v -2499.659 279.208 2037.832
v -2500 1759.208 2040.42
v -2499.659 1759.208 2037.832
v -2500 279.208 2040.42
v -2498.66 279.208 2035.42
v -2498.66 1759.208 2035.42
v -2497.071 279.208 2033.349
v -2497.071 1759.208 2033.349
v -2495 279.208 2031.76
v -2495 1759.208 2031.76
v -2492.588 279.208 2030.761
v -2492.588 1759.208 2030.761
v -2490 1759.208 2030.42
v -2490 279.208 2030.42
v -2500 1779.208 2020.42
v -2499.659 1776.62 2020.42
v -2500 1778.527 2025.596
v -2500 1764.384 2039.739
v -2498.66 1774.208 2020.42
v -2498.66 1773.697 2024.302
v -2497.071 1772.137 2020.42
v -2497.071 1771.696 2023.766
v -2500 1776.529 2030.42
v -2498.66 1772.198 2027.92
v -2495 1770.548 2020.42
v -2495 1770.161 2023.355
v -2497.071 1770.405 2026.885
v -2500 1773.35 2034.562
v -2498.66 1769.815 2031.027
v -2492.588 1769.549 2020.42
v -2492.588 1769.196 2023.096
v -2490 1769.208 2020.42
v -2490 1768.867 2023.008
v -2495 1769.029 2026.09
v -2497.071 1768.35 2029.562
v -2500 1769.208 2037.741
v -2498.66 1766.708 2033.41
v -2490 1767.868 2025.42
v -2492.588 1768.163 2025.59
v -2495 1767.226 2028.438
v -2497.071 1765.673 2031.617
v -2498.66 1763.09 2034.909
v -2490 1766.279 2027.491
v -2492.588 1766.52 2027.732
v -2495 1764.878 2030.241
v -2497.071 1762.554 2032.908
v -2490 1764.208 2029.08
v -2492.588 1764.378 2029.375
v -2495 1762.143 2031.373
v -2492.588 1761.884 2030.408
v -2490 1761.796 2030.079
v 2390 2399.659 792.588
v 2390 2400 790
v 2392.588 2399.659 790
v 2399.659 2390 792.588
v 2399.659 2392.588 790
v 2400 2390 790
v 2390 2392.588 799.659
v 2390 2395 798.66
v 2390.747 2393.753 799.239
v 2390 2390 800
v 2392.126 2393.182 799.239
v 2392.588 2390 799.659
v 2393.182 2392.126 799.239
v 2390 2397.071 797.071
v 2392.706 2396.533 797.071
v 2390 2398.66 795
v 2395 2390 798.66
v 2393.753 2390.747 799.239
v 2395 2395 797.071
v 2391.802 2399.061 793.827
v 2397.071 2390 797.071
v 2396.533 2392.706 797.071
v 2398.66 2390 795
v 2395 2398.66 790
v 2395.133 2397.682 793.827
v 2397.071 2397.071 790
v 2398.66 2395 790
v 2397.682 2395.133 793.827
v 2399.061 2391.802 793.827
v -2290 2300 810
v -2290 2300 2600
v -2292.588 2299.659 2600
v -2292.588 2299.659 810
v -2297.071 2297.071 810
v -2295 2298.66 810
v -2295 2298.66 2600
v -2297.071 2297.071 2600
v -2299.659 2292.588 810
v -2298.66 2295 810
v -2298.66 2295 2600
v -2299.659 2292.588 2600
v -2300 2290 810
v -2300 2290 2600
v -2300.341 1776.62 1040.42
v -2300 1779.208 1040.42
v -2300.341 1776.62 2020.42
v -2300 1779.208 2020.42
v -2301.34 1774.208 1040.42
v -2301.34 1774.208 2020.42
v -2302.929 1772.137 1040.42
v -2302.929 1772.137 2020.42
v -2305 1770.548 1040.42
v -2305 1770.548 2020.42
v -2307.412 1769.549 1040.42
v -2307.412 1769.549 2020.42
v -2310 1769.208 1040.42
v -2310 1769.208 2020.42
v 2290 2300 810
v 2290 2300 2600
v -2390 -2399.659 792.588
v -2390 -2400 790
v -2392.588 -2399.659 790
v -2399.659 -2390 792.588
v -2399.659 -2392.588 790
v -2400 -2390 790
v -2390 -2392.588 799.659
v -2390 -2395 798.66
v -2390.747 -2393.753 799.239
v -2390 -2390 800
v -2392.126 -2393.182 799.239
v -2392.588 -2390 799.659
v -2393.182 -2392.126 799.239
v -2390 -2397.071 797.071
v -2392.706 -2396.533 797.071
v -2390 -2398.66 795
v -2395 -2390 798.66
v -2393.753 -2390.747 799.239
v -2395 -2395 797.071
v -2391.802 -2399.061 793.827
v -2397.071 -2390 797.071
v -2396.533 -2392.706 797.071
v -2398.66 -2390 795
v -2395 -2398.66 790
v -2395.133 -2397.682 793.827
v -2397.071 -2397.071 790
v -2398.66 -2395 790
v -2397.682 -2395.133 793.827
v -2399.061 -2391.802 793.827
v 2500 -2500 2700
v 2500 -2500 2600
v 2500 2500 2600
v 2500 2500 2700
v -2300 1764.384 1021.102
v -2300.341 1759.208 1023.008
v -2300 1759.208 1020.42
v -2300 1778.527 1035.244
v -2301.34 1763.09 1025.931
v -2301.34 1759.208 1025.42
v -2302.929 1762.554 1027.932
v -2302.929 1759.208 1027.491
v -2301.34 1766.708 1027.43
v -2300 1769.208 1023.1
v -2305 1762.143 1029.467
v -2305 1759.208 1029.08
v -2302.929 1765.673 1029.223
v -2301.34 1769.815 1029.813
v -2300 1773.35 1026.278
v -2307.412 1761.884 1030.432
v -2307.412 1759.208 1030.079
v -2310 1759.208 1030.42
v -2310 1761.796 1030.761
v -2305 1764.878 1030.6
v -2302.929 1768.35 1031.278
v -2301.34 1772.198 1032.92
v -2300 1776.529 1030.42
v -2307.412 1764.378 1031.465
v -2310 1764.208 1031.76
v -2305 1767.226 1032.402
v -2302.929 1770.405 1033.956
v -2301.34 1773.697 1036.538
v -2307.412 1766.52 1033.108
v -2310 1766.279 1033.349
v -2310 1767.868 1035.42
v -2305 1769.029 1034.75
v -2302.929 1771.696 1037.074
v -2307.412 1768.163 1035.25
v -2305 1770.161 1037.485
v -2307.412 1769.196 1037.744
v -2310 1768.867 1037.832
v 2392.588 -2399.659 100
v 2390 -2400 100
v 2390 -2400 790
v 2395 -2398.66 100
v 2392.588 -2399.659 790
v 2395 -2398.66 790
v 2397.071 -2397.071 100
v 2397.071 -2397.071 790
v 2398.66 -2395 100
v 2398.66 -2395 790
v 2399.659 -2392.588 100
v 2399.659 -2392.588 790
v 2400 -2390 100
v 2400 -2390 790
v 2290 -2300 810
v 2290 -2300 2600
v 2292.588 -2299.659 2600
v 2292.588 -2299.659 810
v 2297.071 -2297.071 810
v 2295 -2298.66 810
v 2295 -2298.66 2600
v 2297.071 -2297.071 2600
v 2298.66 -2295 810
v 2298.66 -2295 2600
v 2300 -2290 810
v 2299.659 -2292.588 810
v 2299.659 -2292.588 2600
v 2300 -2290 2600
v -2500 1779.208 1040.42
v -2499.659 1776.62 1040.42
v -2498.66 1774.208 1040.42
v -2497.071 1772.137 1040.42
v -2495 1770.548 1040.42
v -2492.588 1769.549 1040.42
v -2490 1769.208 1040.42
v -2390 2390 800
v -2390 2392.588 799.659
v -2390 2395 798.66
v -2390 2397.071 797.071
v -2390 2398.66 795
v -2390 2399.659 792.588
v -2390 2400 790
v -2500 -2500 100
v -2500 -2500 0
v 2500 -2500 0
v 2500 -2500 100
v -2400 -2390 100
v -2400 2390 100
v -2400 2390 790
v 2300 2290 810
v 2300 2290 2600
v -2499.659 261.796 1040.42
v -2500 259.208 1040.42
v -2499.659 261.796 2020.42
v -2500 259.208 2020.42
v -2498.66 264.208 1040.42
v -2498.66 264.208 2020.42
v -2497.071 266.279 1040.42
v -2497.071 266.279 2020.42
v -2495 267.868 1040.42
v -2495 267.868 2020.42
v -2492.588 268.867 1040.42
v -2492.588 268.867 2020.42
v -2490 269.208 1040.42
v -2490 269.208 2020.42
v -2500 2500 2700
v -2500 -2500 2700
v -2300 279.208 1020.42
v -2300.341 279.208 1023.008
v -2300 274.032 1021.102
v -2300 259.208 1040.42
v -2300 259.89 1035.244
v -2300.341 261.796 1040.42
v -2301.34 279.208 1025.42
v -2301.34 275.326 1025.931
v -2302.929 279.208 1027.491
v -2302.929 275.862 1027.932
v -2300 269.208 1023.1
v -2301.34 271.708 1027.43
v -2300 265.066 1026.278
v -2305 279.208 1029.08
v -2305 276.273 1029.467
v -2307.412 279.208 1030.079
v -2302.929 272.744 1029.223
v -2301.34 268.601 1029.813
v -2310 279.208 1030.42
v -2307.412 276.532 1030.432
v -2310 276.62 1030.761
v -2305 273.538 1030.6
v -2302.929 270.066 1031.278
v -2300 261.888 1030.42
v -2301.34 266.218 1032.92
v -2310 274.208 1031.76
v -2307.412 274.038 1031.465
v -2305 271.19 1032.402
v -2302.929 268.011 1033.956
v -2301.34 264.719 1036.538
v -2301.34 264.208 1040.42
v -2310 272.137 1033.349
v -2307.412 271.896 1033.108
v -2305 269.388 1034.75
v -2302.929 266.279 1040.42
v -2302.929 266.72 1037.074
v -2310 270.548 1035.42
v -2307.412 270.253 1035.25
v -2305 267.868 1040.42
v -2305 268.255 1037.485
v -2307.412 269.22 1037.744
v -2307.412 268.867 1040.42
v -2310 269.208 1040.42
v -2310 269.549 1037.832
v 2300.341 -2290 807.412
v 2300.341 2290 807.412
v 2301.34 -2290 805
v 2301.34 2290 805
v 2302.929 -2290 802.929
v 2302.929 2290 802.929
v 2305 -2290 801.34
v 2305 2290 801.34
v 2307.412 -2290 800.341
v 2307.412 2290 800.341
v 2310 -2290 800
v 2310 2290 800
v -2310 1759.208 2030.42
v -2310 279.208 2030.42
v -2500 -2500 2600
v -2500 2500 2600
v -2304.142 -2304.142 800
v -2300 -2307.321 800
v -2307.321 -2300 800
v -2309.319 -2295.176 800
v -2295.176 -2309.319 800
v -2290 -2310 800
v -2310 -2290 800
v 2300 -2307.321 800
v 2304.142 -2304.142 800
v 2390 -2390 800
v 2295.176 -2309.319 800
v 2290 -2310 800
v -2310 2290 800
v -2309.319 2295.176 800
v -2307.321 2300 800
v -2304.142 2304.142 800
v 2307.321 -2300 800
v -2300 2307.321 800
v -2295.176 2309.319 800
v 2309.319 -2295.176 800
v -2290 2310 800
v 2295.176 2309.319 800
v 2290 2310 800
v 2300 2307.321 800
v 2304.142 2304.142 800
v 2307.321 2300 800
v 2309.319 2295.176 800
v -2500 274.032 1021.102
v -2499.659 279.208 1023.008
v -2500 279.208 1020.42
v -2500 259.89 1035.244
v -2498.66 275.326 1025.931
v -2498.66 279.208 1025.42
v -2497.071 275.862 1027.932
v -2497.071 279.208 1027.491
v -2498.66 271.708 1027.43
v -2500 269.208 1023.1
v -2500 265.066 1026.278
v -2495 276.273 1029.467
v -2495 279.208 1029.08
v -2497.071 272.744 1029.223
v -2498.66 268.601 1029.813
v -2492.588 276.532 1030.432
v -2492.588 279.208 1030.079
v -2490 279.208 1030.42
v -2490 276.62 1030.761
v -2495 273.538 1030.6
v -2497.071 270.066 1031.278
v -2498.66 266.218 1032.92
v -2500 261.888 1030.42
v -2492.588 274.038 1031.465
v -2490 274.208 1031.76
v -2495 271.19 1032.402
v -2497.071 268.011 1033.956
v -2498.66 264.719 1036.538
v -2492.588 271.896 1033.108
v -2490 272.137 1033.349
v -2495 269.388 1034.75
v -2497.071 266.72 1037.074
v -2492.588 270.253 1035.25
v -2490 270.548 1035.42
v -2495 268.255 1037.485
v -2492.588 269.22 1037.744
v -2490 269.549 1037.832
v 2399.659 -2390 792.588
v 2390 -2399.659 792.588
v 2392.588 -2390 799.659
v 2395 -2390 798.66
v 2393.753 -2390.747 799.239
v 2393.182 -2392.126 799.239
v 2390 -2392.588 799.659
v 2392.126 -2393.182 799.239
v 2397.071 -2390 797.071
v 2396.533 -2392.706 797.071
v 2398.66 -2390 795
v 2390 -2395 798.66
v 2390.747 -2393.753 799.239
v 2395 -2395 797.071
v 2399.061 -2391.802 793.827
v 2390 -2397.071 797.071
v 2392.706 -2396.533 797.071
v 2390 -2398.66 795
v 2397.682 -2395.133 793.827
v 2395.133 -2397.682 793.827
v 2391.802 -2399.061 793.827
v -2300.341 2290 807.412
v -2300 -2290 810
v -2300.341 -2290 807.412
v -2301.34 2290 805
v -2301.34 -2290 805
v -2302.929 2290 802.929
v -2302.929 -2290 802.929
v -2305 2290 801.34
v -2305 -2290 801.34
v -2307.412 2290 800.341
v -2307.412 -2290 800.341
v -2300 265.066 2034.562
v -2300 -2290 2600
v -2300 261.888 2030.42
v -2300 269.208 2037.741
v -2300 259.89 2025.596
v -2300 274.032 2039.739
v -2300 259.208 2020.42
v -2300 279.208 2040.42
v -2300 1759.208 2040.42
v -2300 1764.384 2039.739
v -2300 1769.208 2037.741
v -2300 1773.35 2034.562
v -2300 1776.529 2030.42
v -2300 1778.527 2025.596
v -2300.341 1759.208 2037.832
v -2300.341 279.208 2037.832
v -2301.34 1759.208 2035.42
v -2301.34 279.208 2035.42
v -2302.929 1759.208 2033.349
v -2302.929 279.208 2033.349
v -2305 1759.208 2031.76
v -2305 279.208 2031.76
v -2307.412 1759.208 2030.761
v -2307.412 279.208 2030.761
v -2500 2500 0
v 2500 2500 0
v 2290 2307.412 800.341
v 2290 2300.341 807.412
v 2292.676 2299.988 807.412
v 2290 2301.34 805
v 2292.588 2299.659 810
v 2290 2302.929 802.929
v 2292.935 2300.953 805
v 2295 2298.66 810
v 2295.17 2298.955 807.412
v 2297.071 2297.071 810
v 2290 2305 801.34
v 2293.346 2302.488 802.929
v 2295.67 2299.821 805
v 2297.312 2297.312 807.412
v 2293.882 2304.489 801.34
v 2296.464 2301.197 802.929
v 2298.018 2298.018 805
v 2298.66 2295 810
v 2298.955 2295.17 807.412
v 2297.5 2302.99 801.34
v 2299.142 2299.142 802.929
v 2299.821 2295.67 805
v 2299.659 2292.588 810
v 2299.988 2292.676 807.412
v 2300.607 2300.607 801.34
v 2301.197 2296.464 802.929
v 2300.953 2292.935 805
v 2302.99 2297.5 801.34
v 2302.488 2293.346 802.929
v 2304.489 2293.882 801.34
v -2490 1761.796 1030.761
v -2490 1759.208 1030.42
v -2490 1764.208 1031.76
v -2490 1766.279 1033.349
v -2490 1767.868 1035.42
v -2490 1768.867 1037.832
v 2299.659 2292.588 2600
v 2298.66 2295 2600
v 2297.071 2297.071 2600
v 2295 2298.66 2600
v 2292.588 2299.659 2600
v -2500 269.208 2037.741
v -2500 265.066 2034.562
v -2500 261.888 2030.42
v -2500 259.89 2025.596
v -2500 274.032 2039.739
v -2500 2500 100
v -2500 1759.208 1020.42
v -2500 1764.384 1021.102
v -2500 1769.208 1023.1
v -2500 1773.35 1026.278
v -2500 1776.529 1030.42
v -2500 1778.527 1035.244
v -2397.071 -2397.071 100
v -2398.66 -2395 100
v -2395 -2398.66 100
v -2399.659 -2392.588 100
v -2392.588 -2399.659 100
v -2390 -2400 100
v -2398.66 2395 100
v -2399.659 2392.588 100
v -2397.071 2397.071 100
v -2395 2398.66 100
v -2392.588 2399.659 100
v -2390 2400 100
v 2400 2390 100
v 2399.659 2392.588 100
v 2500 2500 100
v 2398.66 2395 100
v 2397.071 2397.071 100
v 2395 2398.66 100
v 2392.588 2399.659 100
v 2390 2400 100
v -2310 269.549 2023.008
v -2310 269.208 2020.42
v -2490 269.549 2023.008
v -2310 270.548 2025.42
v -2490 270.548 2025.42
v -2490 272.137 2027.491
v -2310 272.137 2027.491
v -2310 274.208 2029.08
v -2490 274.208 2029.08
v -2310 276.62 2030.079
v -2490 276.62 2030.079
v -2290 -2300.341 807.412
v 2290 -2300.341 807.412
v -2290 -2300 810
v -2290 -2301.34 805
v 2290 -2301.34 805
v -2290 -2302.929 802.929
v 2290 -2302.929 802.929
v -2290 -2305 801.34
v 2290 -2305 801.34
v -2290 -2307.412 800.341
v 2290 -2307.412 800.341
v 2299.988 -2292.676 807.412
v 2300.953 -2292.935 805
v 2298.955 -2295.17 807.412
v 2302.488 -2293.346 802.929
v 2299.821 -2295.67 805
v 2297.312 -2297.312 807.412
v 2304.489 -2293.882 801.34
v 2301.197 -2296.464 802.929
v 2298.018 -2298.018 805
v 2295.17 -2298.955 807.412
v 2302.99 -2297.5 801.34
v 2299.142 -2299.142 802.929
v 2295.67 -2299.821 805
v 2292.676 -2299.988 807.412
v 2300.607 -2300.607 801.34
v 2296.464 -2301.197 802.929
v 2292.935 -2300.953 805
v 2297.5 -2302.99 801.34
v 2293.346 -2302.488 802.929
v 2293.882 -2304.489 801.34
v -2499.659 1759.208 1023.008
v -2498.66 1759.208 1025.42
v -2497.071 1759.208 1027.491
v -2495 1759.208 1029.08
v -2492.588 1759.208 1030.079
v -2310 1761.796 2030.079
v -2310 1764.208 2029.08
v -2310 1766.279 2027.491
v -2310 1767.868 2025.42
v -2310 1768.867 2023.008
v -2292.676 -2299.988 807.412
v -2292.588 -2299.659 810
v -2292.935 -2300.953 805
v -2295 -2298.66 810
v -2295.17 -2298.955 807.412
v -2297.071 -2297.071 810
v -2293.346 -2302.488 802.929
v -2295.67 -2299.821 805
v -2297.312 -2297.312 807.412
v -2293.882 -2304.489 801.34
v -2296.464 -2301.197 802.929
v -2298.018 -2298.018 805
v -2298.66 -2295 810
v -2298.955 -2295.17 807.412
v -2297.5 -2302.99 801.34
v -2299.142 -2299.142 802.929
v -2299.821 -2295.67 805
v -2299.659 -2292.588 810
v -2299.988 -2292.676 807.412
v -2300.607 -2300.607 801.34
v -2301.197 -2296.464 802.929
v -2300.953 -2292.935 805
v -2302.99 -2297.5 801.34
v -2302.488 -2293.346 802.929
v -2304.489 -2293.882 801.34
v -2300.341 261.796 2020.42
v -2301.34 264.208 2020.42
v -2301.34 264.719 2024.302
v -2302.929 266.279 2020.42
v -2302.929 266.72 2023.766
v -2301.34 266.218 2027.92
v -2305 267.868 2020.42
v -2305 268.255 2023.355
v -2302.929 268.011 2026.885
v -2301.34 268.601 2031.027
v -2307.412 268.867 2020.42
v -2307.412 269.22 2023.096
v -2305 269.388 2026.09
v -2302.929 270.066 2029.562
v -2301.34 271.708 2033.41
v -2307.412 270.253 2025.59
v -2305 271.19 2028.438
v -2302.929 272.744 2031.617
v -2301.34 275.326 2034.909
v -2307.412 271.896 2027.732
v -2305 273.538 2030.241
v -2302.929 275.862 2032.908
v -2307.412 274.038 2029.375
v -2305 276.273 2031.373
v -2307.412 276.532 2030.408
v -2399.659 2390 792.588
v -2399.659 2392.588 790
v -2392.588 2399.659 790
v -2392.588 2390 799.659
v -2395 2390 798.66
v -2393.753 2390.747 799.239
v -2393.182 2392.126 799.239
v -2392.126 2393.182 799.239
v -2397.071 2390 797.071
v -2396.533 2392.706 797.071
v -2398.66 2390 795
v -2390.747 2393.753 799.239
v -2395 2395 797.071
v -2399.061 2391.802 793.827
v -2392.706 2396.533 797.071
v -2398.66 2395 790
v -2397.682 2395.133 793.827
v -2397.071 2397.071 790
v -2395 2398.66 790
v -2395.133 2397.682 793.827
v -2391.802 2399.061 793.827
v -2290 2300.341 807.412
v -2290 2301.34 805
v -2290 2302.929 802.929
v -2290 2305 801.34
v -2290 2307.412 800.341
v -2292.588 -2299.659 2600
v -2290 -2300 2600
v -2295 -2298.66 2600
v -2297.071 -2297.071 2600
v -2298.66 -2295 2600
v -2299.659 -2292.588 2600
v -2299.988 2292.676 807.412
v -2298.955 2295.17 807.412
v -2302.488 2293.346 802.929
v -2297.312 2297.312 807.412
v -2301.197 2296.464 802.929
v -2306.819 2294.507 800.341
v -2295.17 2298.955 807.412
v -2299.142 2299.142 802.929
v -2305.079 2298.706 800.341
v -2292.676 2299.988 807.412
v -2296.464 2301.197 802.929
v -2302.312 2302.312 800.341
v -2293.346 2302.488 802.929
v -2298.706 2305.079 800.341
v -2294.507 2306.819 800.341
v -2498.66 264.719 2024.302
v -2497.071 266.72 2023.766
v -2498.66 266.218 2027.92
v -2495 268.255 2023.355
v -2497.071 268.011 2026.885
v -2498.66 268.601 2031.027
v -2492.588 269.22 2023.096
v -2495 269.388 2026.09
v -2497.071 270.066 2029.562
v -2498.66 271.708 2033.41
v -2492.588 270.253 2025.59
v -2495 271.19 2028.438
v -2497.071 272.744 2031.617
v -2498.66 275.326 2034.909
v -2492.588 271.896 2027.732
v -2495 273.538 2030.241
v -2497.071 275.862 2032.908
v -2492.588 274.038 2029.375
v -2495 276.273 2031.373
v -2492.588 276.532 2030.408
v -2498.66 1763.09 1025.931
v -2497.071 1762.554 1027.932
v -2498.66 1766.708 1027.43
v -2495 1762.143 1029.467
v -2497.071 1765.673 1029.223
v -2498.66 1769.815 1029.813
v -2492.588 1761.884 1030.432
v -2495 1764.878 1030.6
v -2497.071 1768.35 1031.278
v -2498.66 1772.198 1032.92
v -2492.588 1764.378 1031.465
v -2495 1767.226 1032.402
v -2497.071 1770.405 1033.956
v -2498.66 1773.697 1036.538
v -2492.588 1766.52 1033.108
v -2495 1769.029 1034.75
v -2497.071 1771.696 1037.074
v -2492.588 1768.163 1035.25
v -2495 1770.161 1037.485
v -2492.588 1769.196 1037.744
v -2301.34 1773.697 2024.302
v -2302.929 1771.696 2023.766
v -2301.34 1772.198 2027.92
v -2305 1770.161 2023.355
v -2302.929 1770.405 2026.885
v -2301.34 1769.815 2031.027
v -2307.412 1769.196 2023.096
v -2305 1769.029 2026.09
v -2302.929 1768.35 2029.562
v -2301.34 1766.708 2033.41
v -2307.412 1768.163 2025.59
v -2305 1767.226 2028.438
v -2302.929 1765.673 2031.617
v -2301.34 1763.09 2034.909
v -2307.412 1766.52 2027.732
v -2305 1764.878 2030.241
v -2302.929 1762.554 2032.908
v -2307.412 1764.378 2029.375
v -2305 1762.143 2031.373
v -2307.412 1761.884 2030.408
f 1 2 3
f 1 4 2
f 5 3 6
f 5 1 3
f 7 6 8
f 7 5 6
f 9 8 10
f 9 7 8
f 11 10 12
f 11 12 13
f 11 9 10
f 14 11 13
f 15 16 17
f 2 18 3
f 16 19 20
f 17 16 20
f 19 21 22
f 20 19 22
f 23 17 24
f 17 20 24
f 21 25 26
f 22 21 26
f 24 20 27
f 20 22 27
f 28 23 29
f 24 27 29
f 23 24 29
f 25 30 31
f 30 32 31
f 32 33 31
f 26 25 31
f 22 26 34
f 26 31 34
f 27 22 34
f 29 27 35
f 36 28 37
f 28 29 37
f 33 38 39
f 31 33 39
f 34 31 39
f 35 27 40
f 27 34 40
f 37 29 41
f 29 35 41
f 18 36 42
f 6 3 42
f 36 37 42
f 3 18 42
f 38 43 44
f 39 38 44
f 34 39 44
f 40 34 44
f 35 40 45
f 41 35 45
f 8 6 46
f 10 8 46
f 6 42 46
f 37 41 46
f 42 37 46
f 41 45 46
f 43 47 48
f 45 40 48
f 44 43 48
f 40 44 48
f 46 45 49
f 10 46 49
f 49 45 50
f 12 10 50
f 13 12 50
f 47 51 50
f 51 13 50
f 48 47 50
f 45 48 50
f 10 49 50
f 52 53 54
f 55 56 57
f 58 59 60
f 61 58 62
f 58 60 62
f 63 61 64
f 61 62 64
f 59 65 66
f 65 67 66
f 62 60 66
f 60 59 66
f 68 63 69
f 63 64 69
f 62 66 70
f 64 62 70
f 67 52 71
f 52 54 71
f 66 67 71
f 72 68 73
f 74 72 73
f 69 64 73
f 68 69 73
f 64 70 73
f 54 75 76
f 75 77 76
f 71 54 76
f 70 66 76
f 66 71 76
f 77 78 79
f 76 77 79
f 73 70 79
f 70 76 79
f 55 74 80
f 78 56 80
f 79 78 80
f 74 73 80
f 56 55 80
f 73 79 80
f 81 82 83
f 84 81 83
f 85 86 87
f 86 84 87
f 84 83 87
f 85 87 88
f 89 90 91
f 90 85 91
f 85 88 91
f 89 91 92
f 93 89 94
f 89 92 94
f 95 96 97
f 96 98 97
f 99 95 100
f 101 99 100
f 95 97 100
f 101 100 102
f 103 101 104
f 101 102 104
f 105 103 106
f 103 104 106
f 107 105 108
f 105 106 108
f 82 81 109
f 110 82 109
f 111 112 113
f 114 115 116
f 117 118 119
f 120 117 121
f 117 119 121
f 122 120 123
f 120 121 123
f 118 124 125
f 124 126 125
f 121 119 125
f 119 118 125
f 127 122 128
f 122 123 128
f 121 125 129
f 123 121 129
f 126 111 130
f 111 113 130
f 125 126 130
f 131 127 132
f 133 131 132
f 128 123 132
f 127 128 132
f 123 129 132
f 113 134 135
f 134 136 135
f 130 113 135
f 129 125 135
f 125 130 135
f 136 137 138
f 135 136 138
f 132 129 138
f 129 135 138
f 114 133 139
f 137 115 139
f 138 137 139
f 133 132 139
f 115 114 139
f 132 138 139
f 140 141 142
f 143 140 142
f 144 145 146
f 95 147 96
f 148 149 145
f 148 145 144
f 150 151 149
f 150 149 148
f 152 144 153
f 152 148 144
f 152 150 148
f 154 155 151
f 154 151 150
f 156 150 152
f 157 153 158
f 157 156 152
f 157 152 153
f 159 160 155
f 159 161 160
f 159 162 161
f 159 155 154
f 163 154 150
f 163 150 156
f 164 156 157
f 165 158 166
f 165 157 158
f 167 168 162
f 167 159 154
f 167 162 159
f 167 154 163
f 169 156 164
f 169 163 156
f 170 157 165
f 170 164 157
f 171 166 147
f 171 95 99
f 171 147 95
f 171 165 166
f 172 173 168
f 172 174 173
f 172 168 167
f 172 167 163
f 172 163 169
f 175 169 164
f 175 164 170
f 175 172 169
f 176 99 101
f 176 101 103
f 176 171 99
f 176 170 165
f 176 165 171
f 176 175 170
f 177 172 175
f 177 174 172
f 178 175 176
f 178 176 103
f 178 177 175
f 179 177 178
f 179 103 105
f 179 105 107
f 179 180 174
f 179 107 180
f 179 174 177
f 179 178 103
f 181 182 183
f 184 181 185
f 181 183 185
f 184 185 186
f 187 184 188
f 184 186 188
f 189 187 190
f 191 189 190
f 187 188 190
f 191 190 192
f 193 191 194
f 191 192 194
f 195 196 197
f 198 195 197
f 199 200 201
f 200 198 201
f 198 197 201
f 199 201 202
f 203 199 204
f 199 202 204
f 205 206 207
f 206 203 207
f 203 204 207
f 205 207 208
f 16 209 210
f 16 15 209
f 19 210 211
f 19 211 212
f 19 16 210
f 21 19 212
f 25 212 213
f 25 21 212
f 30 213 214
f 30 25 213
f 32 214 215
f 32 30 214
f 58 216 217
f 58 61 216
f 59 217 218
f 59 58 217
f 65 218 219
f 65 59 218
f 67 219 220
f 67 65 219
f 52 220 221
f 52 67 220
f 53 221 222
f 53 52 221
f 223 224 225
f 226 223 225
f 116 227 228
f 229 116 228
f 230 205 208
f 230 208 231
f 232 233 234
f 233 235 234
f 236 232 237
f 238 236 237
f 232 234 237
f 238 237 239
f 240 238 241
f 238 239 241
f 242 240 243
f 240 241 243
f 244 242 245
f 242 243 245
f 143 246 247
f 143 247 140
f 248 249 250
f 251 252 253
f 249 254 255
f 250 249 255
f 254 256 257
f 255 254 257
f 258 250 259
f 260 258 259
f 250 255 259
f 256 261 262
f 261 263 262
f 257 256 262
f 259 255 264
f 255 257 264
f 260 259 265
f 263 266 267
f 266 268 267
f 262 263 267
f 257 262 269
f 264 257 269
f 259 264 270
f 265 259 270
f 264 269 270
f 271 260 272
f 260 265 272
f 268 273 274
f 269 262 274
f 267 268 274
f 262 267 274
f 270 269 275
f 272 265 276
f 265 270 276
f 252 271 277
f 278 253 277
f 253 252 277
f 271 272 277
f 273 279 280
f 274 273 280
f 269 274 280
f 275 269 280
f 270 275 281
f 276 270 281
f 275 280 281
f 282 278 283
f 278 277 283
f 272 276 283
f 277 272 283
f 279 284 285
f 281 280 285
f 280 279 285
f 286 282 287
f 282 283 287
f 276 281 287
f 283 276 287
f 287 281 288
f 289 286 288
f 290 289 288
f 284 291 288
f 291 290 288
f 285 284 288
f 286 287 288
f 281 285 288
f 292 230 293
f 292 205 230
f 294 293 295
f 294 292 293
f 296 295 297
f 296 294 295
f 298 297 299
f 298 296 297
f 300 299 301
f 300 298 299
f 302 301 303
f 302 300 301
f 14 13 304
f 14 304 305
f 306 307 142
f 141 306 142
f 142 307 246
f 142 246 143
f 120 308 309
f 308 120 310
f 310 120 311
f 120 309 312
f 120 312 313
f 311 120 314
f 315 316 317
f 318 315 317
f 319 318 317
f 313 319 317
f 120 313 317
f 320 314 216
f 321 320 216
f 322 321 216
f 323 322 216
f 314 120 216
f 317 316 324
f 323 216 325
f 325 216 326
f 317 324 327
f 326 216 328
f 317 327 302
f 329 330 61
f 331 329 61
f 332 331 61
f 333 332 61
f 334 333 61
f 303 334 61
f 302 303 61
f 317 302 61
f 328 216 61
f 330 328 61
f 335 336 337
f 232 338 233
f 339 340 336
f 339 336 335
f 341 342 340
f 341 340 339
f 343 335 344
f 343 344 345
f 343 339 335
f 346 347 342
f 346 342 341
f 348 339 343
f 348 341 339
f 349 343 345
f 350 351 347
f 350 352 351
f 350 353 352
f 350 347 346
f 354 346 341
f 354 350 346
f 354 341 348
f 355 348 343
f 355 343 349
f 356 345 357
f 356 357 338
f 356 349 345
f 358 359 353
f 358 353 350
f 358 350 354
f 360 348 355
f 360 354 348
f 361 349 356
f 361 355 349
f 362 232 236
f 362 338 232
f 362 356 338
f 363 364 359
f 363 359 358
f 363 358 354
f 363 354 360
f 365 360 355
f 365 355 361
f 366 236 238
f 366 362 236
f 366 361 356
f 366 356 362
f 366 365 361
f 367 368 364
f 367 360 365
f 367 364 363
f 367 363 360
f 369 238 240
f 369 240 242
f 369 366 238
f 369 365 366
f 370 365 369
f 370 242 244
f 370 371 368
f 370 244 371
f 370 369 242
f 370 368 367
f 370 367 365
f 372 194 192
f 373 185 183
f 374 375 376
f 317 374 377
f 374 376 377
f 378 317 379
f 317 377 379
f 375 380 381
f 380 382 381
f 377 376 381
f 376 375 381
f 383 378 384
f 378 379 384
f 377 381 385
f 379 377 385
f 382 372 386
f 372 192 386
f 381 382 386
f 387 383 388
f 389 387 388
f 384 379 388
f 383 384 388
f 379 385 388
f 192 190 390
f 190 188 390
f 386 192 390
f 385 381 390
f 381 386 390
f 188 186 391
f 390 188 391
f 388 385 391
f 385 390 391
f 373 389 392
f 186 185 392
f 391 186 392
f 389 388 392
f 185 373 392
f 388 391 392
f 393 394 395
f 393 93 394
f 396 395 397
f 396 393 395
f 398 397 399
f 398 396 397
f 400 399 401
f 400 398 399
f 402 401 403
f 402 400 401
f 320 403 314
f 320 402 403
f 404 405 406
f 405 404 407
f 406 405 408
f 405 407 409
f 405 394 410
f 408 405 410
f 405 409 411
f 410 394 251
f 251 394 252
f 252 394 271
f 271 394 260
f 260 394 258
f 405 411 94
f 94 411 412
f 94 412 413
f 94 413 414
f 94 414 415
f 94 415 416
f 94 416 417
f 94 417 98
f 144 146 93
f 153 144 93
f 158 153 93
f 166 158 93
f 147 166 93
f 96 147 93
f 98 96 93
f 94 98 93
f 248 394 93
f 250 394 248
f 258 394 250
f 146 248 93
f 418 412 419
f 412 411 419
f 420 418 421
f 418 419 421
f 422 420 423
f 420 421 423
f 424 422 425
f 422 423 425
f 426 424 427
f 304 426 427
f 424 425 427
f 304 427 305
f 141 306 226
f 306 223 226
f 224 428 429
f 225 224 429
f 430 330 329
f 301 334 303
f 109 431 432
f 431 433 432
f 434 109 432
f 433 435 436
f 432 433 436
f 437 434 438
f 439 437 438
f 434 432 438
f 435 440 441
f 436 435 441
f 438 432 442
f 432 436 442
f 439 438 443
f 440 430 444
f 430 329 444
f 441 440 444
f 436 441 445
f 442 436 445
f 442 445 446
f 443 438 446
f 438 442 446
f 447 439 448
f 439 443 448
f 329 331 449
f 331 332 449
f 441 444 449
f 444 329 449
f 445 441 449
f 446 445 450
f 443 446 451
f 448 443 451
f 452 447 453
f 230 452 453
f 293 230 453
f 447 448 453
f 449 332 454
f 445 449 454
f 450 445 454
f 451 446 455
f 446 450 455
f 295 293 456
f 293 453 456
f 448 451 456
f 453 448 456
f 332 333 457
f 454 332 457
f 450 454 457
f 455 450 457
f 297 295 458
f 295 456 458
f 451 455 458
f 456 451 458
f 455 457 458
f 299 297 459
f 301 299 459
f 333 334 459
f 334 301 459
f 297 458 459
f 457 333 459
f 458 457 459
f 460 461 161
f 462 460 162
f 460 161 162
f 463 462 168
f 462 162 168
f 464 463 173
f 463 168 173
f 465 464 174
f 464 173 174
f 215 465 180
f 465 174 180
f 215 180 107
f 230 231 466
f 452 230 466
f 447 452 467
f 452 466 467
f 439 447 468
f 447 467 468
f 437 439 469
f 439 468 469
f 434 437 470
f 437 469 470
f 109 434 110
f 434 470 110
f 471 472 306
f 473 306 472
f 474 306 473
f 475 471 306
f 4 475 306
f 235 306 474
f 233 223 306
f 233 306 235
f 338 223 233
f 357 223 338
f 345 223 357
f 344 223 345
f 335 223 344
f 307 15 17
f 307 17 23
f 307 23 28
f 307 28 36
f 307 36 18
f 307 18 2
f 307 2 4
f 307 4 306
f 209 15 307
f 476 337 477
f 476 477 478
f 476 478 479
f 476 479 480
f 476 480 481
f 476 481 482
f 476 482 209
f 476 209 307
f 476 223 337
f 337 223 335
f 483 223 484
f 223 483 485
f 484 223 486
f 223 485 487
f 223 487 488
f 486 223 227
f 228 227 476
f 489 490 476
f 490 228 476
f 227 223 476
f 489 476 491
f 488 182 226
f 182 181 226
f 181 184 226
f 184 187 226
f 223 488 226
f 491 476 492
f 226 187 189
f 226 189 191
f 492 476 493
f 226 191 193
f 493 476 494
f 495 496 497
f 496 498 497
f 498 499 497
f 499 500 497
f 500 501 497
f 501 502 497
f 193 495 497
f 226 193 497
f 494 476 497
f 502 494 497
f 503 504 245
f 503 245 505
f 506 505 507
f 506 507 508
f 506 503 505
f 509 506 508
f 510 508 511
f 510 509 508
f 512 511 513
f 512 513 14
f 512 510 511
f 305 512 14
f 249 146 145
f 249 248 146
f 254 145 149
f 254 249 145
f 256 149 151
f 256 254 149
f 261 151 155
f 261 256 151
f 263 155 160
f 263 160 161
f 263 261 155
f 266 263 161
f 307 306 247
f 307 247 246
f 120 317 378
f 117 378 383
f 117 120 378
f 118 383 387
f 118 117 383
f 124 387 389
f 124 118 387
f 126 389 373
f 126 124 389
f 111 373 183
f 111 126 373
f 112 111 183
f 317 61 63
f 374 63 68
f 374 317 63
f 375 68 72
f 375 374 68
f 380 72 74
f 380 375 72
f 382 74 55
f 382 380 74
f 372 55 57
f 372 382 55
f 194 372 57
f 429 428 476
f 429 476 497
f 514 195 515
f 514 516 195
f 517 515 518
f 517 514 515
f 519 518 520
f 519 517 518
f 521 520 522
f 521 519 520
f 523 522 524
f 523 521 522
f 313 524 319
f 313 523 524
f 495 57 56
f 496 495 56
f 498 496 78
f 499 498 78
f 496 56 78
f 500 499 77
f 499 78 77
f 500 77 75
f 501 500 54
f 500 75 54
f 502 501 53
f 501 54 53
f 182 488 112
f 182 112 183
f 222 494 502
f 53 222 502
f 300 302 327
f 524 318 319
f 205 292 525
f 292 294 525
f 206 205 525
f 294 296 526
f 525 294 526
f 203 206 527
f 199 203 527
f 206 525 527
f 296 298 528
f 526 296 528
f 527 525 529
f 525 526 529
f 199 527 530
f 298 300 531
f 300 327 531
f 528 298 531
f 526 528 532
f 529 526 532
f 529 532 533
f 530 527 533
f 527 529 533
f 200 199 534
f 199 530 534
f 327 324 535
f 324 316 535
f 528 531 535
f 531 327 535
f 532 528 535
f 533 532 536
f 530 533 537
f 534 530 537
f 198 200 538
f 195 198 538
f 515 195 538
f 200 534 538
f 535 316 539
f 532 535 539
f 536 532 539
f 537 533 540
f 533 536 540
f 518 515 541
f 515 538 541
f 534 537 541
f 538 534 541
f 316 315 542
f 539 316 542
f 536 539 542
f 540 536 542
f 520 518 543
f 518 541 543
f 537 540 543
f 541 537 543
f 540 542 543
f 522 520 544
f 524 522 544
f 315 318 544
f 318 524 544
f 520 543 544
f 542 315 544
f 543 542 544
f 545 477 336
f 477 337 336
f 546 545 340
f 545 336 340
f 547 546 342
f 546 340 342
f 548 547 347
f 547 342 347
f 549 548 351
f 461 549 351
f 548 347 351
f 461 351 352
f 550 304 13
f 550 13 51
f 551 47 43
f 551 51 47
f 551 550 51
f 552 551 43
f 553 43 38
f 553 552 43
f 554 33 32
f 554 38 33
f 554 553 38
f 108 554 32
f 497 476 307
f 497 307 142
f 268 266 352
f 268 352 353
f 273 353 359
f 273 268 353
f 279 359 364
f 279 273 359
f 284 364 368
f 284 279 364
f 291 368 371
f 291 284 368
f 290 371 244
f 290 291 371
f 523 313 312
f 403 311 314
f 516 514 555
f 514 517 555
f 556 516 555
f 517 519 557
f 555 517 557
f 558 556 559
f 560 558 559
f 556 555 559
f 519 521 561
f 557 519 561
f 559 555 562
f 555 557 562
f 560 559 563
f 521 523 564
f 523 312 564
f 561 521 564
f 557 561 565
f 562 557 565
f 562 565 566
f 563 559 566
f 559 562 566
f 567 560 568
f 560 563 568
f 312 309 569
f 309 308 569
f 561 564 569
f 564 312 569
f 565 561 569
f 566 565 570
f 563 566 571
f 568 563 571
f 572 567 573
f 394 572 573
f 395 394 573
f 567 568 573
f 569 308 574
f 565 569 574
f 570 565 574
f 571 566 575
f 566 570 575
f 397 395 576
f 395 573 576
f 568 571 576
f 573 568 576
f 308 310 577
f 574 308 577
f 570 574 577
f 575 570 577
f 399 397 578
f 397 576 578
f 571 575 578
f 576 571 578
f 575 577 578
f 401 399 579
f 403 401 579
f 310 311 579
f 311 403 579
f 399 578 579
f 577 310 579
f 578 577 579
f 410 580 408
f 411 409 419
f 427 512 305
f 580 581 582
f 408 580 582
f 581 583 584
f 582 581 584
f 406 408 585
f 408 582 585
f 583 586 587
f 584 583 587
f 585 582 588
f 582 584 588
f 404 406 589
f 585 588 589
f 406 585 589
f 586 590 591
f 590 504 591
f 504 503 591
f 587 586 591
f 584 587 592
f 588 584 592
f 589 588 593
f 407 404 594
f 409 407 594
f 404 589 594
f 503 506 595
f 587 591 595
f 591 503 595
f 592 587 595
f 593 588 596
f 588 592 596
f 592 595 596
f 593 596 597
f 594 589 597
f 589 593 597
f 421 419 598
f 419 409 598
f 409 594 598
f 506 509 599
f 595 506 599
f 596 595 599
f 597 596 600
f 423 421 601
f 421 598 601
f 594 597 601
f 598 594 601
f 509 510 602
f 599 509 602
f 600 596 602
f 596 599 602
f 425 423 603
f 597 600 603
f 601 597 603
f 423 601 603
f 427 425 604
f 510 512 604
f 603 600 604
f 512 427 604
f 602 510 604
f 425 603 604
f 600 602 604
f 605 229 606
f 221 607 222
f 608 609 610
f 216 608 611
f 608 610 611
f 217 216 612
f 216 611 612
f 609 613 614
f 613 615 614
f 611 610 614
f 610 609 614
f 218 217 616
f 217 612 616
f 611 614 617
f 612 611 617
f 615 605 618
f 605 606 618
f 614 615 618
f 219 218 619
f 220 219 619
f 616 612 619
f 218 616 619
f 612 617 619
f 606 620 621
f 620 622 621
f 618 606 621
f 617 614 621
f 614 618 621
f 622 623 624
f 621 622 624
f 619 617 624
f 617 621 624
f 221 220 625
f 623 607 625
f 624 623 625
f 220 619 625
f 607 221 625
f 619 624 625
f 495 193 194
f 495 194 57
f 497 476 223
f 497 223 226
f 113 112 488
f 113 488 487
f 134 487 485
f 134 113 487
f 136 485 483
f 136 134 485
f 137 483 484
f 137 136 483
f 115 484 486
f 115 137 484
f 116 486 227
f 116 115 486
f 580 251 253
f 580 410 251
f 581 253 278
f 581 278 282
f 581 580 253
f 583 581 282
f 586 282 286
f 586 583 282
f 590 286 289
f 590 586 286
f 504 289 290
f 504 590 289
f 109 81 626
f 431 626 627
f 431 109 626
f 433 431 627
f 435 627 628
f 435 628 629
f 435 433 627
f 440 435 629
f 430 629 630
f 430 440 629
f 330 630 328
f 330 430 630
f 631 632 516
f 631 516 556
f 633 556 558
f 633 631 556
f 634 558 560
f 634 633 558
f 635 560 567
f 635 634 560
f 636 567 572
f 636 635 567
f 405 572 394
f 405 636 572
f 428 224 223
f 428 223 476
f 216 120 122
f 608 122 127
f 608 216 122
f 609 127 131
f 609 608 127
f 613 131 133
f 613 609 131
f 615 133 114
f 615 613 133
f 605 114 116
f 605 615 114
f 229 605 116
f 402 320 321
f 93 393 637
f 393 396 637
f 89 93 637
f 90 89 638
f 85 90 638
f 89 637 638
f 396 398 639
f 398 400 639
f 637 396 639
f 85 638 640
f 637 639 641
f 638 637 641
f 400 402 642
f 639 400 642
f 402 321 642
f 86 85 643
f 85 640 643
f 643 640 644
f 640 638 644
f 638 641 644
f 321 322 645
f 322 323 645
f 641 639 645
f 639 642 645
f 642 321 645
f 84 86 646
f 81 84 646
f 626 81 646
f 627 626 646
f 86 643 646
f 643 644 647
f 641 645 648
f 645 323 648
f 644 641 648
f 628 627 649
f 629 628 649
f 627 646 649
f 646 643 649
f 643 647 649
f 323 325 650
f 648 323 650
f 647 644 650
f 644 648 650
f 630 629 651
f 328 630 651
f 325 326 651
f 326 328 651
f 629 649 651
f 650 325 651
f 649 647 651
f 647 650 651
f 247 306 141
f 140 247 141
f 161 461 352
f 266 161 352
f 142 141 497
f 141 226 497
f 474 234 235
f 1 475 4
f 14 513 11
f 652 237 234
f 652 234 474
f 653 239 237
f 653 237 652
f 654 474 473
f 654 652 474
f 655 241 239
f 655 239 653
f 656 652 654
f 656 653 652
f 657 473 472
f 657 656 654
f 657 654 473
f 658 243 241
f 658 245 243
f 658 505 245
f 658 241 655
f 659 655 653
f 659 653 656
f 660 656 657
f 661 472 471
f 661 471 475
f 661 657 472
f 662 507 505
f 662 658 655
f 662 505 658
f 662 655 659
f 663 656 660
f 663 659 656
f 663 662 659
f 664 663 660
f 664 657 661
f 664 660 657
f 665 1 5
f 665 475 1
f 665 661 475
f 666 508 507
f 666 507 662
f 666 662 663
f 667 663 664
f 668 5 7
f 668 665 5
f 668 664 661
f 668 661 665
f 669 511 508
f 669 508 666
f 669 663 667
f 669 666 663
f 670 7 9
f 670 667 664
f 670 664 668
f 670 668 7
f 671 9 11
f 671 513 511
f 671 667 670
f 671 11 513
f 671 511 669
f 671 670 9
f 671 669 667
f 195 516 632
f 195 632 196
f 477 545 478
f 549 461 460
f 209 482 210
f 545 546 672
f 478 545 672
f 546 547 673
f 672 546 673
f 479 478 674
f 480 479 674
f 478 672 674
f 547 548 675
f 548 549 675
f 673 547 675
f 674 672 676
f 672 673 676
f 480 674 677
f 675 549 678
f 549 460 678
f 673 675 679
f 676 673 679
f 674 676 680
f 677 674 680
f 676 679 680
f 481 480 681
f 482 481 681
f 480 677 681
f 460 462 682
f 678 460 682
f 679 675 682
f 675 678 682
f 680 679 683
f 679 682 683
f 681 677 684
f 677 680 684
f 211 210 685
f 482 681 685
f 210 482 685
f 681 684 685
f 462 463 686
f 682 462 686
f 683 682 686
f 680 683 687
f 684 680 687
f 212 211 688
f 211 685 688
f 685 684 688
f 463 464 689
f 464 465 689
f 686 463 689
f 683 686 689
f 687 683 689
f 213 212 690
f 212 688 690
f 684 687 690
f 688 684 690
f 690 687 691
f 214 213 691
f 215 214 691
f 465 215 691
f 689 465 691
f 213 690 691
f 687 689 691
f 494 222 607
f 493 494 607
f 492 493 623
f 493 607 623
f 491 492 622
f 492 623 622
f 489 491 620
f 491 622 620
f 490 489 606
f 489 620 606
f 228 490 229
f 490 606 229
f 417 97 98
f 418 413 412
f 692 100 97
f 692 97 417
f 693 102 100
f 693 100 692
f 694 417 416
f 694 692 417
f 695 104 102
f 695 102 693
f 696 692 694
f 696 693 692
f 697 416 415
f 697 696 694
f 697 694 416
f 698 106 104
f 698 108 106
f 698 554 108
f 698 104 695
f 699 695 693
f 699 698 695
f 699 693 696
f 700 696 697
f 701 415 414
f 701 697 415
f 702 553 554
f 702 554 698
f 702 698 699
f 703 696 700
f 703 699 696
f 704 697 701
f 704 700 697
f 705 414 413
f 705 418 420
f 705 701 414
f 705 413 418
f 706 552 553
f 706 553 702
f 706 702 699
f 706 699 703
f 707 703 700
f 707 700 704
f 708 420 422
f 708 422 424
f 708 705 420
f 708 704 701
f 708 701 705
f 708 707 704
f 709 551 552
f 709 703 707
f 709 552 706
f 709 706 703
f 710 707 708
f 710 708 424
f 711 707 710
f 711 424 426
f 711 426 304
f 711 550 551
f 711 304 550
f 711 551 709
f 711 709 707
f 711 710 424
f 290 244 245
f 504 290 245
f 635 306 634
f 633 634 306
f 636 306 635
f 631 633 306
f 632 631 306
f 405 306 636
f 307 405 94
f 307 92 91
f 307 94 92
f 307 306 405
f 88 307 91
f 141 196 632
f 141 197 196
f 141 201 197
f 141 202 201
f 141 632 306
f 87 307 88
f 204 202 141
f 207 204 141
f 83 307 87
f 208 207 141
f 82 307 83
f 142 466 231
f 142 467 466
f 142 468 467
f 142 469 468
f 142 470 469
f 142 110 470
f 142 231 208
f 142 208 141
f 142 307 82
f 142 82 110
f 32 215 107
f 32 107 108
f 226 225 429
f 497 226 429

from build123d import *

# Parameters (mm, degrees)
F0_W     = 5000
F0_H     = 5000
F1_DEPTH = 100
F2_W     = 5000
F2_H     = 5000
F2_W_2   = 4800
F2_H_2   = 4800
F3_DEPTH = 700
F4_W     = 5000
F4_H     = 5000
F4_W_2   = 4800
F4_H_2   = 4800
F4_W_3   = 4600
F4_H_3   = 4600
F5_DEPTH = 1800
F6_W     = 5000
F6_H     = 5000
F6_W_2   = 4600
F6_H_2   = 4600
F7_DEPTH = 100
F8_W     = 1500
F8_H     = 1000
F9_DEPTH = 200
F10_R    = 10
F11_R    = 10
F12_R    = 10


with BuildPart() as f1:
    # F0 (on Top) → F1 (new body)
    with BuildSketch(Plane.XY):
        Rectangle(F0_W, F0_H)
    extrude(amount=F1_DEPTH)


with BuildPart() as f3:
    # F2 (on face) → F3 (new body)
    with BuildSketch(Plane.XY.offset(100)):
        Rectangle(F2_W, F2_H)
        Rectangle(F2_W_2, F2_H_2, mode=Mode.SUBTRACT)
    extrude(amount=F3_DEPTH)

    # F4 (on face) → F5 (join)
    with BuildSketch(Plane.XY.offset(800)):
        Rectangle(F4_W, F4_H)
        Rectangle(F4_W_2, F4_H_2, mode=Mode.SUBTRACT)
        Rectangle(F4_W_2, F4_H_2)
        Rectangle(F4_W_3, F4_H_3, mode=Mode.SUBTRACT)
    extrude(amount=F5_DEPTH)

    # F8 (on face) → F9 (cut, through all)
    with BuildSketch(Plane(origin=(-2500, 0, 0), x_dir=(0, -1, 0), z_dir=(-1, 0, 0))):
        with Locations((-1019.208073616, 1530.4200649261)):
            Rectangle(F8_W, F8_H)
    extrude(amount=-F9_DEPTH, mode=Mode.SUBTRACT)

    # F10
    f10_edges = [f3.edges().sort_by_distance(p)[0] for p in [
        (-2300, 2300, 1700),
        (2300, 2300, 1700),
        (2300, -2300, 1700),
        (-2300, -2300, 1700),
        (-2400, -2400, 450),
        (-2400, 2400, 450),
        (2400, 2400, 450),
        (2400, -2400, 450),
    ]]
    fillet(f10_edges, radius=F10_R)

    # F11
    f11_edges = [f3.edges().sort_by_distance(p)[0] for p in [
        (0, 2300, 800),
        (0, 2400, 800),
    ]]
    fillet(f11_edges, radius=F11_R)

    # F12
    f12_edges = [f3.edges().sort_by_distance(p)[0] for p in [
        (-2400, 1769.208074, 1030.420065),
        (-2400, 269.208074, 1030.420065),
        (-2500, 1019.208074, 1030.420065),
        (-2300, 1019.208074, 1030.420065),
        (-2400, 1769.208074, 2030.420065),
        (-2500, 1769.208074, 1530.420065),
        (-2300, 1769.208074, 1530.420065),
        (-2400, 269.208074, 2030.420065),
        (-2500, 269.208074, 1530.420065),
        (-2300, 269.208074, 1530.420065),
        (-2500, 1019.208074, 2030.420065),
        (-2300, 1019.208074, 2030.420065),
    ]]
    fillet(f12_edges, radius=F12_R)


with BuildPart() as f7:
    # F6 (on face) → F7 (new body)
    with BuildSketch(Plane.XY.offset(2600)):
        Rectangle(F6_W, F6_H)
        Rectangle(F6_W_2, F6_H_2, mode=Mode.SUBTRACT)
        Rectangle(F6_W_2, F6_H_2)
    extrude(amount=F7_DEPTH)


solid = Compound([f1.part, f3.part, f7.part])
